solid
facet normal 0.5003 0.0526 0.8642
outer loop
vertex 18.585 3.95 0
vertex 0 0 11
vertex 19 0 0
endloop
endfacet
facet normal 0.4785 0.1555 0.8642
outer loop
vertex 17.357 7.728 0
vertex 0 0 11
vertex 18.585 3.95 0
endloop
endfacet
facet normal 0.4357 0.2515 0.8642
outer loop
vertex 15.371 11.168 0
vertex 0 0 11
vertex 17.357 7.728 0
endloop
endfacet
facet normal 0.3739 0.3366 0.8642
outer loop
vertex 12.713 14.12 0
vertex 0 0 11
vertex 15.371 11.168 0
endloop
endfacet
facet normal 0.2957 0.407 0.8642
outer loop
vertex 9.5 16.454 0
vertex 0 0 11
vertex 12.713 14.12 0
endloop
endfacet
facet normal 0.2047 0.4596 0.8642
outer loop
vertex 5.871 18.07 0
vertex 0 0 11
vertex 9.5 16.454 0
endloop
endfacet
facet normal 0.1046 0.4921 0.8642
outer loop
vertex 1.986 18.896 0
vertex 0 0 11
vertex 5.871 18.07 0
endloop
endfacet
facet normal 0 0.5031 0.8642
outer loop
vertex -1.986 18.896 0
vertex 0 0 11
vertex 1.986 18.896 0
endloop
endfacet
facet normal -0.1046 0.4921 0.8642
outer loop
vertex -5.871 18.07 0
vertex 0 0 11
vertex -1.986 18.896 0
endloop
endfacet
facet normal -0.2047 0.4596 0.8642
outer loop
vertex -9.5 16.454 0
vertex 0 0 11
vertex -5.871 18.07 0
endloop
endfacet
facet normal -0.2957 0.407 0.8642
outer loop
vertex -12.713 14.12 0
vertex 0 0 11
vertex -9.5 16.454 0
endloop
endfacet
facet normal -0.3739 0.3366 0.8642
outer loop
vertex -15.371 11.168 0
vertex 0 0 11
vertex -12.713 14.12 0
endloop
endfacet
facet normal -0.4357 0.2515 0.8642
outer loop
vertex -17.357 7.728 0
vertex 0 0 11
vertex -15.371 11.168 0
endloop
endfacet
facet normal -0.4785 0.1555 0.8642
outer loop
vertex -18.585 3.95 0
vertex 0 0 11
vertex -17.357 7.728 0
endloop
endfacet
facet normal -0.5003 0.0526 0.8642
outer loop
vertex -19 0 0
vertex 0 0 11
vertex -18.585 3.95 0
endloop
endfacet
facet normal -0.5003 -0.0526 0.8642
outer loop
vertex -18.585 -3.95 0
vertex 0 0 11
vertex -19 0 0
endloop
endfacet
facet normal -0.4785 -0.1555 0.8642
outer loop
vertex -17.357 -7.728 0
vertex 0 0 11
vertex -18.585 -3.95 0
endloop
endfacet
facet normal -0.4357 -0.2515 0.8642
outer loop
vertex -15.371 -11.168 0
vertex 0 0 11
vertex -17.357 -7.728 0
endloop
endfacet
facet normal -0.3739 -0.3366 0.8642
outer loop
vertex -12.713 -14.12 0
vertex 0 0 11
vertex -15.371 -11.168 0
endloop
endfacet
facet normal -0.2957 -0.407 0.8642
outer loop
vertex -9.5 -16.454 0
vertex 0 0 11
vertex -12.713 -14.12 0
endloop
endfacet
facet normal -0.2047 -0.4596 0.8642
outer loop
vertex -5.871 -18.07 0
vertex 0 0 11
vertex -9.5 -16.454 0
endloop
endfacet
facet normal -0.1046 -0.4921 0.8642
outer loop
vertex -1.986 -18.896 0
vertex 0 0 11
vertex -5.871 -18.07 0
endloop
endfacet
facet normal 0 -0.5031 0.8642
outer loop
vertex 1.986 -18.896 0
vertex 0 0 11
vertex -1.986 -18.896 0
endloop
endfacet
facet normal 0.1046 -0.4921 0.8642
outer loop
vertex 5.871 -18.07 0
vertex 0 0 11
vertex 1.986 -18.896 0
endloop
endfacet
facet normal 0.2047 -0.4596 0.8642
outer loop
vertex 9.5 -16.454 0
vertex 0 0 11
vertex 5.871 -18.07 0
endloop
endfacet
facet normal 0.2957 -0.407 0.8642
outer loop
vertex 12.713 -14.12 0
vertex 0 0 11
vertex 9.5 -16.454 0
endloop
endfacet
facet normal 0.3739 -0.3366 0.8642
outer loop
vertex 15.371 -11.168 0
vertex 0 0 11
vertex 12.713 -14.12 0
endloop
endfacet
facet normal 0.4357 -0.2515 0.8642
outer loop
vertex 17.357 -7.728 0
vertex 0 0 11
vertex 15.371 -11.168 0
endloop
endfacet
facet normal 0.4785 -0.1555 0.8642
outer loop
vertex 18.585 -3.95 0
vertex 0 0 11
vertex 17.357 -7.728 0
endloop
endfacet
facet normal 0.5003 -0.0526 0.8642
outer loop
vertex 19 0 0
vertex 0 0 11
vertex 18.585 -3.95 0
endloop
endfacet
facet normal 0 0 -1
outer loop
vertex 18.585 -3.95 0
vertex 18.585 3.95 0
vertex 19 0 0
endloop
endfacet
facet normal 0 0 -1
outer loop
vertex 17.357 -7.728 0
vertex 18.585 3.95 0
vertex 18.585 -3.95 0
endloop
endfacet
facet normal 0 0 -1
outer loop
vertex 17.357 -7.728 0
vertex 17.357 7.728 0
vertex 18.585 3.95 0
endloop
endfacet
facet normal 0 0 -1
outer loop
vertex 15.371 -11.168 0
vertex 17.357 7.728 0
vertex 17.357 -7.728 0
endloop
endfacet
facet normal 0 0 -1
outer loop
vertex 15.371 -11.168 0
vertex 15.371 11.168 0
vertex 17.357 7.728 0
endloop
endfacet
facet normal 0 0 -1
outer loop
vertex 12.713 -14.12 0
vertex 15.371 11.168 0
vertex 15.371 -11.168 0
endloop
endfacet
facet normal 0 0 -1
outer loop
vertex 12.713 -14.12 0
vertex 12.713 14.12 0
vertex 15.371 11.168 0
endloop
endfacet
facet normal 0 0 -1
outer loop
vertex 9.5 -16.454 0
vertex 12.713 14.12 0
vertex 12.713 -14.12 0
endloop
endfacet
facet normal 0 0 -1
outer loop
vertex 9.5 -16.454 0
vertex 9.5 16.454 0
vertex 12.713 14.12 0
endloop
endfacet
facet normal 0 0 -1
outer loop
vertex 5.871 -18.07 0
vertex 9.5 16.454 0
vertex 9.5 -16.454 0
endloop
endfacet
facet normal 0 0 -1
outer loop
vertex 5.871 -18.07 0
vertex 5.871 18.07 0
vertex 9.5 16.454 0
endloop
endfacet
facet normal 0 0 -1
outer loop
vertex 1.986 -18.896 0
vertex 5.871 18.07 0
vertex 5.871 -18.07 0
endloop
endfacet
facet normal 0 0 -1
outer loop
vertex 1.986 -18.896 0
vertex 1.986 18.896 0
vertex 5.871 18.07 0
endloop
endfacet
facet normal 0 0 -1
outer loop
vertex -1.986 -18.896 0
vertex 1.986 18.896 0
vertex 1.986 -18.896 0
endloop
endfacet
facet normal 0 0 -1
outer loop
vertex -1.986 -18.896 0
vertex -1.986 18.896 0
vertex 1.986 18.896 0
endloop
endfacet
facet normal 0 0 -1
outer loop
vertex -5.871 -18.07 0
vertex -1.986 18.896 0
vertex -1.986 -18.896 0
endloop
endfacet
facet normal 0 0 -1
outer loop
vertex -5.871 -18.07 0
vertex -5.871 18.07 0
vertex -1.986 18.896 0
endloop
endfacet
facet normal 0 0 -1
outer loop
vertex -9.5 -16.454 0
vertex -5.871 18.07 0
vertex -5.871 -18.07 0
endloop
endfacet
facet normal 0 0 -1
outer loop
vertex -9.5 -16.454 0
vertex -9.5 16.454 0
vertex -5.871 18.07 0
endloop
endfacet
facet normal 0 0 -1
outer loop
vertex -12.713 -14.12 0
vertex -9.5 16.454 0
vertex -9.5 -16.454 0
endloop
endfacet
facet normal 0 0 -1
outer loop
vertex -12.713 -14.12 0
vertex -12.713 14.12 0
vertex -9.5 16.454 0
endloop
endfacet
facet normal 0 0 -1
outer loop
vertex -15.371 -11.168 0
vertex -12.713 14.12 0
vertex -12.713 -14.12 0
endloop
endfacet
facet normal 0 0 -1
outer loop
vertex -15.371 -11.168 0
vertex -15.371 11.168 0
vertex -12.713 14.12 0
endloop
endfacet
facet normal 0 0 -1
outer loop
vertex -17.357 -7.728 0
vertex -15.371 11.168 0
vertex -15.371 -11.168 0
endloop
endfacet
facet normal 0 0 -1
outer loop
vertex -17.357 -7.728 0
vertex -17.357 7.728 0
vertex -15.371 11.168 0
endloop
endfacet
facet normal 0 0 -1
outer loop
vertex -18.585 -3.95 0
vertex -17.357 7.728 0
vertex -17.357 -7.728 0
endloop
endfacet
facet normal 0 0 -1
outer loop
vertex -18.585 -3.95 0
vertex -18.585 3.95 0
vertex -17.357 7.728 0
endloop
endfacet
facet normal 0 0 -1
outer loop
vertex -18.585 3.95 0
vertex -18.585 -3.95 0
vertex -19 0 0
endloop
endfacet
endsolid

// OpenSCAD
// Generated by SolidPython 1.0.1 on 2020-07-29 00:39:25


cylinder(h = 11, r1 = 19, r2 = 0);
/***********************************************
*********      SolidPython code:      **********
************************************************
 
# import packages: SolidPython
from solid import *
from solid.utils import *
from itertools import chain, combinations


class Resize:

    def __init__(self, scad_file):
        self.scad_file = scad_file
        #self.scad_file = import_scad(scad_file)
        # cone/cylinder param:
        self.r1 = 0
        self.r2 = 0
        self.h = 0
        # rectangular prism param:
        self.w = 0
        self.l = 0
        # ellipse param:
        self.r = 0

    # import OpenScad code (file name corresponds to shape)


    # classify shape + parameters
    def assign(self, param1, param2, param3):
        if self.scad_file == 'cone.scad':
            self.r1 = param1
            self.r2 = param2
            self.h = param3
        elif self.scad_file == 'cylinder.scad':
            self.r1 = param1
            self.r2 = param2
            self.h = param3
        elif self.scad_file == 'rectangularPrism.scad':
            self.h = param1
            self.l = param2
            self.w = param3
        else:
            self.r = param1
            self.h = param2

    # resize parameters
    def iterate(self):
        x = range(3, 20, 2)
        i = 1
        if self.scad_file == 'cone.scad':
            tempList = list(combinations(x, 2))
            for temp in tempList:
                param1 = temp[0]
                param2 = temp[1]
                filepath = 'produced_scad_files/' + 'cone' + str(param1) + '_' + str(param2) + '_' + '.scad'
                scad_render_to_file(cylinder(h=param1, r1=param2, r2=0), filepath)

        elif self.scad_file == 'cylinder.scad':
            tempList = list(combinations(x, 3))
            for temp in tempList:
                param1 = temp[0]
                param2 = temp[1]
                filepath = 'produced_scad_files/' + 'cylinder' + str(param1) + '_' + str(param2) + '_' + '.scad'
                scad_render_to_file(cylinder(h=param1, r1=param2, r2=param2), filepath)

        elif self.scad_file == 'rectangularPrism.scad':
            tempList = list(combinations(x, 3))
            for temp in tempList:
                param1 = temp[0]
                param2 = temp[1]
                param3 = temp[2]
                filepath = 'produced_scad_files/' + 'rectangularPrism' + str(param1) + '_' + str(param2) + '_' + str(
                    param3) + '.scad'
                scad_render_to_file(cube(size=(param1, param2, param3)), filepath)

        elif self.scad_file == 'ellipse.scad':
            tempList = list(combinations(x, 4))
            for temp in tempList:
                param1 = temp[0]
                param2 = temp[1]
                param3 = temp[2]
                param4 = temp[3]
                filepath = 'produced_scad_files/' + 'ellipse' + str(param1) + '_' + str(param2) + '_' + str(param3) + '_' + str(param4) + '.scad'
                scad_render_to_file(scale([param1, param2, param3])(sphere(r=param4)), filepath)

    def render_to_scadfile(self):
        scad_render_to_file(scad, 'example.scad') 
 
************************************************/
